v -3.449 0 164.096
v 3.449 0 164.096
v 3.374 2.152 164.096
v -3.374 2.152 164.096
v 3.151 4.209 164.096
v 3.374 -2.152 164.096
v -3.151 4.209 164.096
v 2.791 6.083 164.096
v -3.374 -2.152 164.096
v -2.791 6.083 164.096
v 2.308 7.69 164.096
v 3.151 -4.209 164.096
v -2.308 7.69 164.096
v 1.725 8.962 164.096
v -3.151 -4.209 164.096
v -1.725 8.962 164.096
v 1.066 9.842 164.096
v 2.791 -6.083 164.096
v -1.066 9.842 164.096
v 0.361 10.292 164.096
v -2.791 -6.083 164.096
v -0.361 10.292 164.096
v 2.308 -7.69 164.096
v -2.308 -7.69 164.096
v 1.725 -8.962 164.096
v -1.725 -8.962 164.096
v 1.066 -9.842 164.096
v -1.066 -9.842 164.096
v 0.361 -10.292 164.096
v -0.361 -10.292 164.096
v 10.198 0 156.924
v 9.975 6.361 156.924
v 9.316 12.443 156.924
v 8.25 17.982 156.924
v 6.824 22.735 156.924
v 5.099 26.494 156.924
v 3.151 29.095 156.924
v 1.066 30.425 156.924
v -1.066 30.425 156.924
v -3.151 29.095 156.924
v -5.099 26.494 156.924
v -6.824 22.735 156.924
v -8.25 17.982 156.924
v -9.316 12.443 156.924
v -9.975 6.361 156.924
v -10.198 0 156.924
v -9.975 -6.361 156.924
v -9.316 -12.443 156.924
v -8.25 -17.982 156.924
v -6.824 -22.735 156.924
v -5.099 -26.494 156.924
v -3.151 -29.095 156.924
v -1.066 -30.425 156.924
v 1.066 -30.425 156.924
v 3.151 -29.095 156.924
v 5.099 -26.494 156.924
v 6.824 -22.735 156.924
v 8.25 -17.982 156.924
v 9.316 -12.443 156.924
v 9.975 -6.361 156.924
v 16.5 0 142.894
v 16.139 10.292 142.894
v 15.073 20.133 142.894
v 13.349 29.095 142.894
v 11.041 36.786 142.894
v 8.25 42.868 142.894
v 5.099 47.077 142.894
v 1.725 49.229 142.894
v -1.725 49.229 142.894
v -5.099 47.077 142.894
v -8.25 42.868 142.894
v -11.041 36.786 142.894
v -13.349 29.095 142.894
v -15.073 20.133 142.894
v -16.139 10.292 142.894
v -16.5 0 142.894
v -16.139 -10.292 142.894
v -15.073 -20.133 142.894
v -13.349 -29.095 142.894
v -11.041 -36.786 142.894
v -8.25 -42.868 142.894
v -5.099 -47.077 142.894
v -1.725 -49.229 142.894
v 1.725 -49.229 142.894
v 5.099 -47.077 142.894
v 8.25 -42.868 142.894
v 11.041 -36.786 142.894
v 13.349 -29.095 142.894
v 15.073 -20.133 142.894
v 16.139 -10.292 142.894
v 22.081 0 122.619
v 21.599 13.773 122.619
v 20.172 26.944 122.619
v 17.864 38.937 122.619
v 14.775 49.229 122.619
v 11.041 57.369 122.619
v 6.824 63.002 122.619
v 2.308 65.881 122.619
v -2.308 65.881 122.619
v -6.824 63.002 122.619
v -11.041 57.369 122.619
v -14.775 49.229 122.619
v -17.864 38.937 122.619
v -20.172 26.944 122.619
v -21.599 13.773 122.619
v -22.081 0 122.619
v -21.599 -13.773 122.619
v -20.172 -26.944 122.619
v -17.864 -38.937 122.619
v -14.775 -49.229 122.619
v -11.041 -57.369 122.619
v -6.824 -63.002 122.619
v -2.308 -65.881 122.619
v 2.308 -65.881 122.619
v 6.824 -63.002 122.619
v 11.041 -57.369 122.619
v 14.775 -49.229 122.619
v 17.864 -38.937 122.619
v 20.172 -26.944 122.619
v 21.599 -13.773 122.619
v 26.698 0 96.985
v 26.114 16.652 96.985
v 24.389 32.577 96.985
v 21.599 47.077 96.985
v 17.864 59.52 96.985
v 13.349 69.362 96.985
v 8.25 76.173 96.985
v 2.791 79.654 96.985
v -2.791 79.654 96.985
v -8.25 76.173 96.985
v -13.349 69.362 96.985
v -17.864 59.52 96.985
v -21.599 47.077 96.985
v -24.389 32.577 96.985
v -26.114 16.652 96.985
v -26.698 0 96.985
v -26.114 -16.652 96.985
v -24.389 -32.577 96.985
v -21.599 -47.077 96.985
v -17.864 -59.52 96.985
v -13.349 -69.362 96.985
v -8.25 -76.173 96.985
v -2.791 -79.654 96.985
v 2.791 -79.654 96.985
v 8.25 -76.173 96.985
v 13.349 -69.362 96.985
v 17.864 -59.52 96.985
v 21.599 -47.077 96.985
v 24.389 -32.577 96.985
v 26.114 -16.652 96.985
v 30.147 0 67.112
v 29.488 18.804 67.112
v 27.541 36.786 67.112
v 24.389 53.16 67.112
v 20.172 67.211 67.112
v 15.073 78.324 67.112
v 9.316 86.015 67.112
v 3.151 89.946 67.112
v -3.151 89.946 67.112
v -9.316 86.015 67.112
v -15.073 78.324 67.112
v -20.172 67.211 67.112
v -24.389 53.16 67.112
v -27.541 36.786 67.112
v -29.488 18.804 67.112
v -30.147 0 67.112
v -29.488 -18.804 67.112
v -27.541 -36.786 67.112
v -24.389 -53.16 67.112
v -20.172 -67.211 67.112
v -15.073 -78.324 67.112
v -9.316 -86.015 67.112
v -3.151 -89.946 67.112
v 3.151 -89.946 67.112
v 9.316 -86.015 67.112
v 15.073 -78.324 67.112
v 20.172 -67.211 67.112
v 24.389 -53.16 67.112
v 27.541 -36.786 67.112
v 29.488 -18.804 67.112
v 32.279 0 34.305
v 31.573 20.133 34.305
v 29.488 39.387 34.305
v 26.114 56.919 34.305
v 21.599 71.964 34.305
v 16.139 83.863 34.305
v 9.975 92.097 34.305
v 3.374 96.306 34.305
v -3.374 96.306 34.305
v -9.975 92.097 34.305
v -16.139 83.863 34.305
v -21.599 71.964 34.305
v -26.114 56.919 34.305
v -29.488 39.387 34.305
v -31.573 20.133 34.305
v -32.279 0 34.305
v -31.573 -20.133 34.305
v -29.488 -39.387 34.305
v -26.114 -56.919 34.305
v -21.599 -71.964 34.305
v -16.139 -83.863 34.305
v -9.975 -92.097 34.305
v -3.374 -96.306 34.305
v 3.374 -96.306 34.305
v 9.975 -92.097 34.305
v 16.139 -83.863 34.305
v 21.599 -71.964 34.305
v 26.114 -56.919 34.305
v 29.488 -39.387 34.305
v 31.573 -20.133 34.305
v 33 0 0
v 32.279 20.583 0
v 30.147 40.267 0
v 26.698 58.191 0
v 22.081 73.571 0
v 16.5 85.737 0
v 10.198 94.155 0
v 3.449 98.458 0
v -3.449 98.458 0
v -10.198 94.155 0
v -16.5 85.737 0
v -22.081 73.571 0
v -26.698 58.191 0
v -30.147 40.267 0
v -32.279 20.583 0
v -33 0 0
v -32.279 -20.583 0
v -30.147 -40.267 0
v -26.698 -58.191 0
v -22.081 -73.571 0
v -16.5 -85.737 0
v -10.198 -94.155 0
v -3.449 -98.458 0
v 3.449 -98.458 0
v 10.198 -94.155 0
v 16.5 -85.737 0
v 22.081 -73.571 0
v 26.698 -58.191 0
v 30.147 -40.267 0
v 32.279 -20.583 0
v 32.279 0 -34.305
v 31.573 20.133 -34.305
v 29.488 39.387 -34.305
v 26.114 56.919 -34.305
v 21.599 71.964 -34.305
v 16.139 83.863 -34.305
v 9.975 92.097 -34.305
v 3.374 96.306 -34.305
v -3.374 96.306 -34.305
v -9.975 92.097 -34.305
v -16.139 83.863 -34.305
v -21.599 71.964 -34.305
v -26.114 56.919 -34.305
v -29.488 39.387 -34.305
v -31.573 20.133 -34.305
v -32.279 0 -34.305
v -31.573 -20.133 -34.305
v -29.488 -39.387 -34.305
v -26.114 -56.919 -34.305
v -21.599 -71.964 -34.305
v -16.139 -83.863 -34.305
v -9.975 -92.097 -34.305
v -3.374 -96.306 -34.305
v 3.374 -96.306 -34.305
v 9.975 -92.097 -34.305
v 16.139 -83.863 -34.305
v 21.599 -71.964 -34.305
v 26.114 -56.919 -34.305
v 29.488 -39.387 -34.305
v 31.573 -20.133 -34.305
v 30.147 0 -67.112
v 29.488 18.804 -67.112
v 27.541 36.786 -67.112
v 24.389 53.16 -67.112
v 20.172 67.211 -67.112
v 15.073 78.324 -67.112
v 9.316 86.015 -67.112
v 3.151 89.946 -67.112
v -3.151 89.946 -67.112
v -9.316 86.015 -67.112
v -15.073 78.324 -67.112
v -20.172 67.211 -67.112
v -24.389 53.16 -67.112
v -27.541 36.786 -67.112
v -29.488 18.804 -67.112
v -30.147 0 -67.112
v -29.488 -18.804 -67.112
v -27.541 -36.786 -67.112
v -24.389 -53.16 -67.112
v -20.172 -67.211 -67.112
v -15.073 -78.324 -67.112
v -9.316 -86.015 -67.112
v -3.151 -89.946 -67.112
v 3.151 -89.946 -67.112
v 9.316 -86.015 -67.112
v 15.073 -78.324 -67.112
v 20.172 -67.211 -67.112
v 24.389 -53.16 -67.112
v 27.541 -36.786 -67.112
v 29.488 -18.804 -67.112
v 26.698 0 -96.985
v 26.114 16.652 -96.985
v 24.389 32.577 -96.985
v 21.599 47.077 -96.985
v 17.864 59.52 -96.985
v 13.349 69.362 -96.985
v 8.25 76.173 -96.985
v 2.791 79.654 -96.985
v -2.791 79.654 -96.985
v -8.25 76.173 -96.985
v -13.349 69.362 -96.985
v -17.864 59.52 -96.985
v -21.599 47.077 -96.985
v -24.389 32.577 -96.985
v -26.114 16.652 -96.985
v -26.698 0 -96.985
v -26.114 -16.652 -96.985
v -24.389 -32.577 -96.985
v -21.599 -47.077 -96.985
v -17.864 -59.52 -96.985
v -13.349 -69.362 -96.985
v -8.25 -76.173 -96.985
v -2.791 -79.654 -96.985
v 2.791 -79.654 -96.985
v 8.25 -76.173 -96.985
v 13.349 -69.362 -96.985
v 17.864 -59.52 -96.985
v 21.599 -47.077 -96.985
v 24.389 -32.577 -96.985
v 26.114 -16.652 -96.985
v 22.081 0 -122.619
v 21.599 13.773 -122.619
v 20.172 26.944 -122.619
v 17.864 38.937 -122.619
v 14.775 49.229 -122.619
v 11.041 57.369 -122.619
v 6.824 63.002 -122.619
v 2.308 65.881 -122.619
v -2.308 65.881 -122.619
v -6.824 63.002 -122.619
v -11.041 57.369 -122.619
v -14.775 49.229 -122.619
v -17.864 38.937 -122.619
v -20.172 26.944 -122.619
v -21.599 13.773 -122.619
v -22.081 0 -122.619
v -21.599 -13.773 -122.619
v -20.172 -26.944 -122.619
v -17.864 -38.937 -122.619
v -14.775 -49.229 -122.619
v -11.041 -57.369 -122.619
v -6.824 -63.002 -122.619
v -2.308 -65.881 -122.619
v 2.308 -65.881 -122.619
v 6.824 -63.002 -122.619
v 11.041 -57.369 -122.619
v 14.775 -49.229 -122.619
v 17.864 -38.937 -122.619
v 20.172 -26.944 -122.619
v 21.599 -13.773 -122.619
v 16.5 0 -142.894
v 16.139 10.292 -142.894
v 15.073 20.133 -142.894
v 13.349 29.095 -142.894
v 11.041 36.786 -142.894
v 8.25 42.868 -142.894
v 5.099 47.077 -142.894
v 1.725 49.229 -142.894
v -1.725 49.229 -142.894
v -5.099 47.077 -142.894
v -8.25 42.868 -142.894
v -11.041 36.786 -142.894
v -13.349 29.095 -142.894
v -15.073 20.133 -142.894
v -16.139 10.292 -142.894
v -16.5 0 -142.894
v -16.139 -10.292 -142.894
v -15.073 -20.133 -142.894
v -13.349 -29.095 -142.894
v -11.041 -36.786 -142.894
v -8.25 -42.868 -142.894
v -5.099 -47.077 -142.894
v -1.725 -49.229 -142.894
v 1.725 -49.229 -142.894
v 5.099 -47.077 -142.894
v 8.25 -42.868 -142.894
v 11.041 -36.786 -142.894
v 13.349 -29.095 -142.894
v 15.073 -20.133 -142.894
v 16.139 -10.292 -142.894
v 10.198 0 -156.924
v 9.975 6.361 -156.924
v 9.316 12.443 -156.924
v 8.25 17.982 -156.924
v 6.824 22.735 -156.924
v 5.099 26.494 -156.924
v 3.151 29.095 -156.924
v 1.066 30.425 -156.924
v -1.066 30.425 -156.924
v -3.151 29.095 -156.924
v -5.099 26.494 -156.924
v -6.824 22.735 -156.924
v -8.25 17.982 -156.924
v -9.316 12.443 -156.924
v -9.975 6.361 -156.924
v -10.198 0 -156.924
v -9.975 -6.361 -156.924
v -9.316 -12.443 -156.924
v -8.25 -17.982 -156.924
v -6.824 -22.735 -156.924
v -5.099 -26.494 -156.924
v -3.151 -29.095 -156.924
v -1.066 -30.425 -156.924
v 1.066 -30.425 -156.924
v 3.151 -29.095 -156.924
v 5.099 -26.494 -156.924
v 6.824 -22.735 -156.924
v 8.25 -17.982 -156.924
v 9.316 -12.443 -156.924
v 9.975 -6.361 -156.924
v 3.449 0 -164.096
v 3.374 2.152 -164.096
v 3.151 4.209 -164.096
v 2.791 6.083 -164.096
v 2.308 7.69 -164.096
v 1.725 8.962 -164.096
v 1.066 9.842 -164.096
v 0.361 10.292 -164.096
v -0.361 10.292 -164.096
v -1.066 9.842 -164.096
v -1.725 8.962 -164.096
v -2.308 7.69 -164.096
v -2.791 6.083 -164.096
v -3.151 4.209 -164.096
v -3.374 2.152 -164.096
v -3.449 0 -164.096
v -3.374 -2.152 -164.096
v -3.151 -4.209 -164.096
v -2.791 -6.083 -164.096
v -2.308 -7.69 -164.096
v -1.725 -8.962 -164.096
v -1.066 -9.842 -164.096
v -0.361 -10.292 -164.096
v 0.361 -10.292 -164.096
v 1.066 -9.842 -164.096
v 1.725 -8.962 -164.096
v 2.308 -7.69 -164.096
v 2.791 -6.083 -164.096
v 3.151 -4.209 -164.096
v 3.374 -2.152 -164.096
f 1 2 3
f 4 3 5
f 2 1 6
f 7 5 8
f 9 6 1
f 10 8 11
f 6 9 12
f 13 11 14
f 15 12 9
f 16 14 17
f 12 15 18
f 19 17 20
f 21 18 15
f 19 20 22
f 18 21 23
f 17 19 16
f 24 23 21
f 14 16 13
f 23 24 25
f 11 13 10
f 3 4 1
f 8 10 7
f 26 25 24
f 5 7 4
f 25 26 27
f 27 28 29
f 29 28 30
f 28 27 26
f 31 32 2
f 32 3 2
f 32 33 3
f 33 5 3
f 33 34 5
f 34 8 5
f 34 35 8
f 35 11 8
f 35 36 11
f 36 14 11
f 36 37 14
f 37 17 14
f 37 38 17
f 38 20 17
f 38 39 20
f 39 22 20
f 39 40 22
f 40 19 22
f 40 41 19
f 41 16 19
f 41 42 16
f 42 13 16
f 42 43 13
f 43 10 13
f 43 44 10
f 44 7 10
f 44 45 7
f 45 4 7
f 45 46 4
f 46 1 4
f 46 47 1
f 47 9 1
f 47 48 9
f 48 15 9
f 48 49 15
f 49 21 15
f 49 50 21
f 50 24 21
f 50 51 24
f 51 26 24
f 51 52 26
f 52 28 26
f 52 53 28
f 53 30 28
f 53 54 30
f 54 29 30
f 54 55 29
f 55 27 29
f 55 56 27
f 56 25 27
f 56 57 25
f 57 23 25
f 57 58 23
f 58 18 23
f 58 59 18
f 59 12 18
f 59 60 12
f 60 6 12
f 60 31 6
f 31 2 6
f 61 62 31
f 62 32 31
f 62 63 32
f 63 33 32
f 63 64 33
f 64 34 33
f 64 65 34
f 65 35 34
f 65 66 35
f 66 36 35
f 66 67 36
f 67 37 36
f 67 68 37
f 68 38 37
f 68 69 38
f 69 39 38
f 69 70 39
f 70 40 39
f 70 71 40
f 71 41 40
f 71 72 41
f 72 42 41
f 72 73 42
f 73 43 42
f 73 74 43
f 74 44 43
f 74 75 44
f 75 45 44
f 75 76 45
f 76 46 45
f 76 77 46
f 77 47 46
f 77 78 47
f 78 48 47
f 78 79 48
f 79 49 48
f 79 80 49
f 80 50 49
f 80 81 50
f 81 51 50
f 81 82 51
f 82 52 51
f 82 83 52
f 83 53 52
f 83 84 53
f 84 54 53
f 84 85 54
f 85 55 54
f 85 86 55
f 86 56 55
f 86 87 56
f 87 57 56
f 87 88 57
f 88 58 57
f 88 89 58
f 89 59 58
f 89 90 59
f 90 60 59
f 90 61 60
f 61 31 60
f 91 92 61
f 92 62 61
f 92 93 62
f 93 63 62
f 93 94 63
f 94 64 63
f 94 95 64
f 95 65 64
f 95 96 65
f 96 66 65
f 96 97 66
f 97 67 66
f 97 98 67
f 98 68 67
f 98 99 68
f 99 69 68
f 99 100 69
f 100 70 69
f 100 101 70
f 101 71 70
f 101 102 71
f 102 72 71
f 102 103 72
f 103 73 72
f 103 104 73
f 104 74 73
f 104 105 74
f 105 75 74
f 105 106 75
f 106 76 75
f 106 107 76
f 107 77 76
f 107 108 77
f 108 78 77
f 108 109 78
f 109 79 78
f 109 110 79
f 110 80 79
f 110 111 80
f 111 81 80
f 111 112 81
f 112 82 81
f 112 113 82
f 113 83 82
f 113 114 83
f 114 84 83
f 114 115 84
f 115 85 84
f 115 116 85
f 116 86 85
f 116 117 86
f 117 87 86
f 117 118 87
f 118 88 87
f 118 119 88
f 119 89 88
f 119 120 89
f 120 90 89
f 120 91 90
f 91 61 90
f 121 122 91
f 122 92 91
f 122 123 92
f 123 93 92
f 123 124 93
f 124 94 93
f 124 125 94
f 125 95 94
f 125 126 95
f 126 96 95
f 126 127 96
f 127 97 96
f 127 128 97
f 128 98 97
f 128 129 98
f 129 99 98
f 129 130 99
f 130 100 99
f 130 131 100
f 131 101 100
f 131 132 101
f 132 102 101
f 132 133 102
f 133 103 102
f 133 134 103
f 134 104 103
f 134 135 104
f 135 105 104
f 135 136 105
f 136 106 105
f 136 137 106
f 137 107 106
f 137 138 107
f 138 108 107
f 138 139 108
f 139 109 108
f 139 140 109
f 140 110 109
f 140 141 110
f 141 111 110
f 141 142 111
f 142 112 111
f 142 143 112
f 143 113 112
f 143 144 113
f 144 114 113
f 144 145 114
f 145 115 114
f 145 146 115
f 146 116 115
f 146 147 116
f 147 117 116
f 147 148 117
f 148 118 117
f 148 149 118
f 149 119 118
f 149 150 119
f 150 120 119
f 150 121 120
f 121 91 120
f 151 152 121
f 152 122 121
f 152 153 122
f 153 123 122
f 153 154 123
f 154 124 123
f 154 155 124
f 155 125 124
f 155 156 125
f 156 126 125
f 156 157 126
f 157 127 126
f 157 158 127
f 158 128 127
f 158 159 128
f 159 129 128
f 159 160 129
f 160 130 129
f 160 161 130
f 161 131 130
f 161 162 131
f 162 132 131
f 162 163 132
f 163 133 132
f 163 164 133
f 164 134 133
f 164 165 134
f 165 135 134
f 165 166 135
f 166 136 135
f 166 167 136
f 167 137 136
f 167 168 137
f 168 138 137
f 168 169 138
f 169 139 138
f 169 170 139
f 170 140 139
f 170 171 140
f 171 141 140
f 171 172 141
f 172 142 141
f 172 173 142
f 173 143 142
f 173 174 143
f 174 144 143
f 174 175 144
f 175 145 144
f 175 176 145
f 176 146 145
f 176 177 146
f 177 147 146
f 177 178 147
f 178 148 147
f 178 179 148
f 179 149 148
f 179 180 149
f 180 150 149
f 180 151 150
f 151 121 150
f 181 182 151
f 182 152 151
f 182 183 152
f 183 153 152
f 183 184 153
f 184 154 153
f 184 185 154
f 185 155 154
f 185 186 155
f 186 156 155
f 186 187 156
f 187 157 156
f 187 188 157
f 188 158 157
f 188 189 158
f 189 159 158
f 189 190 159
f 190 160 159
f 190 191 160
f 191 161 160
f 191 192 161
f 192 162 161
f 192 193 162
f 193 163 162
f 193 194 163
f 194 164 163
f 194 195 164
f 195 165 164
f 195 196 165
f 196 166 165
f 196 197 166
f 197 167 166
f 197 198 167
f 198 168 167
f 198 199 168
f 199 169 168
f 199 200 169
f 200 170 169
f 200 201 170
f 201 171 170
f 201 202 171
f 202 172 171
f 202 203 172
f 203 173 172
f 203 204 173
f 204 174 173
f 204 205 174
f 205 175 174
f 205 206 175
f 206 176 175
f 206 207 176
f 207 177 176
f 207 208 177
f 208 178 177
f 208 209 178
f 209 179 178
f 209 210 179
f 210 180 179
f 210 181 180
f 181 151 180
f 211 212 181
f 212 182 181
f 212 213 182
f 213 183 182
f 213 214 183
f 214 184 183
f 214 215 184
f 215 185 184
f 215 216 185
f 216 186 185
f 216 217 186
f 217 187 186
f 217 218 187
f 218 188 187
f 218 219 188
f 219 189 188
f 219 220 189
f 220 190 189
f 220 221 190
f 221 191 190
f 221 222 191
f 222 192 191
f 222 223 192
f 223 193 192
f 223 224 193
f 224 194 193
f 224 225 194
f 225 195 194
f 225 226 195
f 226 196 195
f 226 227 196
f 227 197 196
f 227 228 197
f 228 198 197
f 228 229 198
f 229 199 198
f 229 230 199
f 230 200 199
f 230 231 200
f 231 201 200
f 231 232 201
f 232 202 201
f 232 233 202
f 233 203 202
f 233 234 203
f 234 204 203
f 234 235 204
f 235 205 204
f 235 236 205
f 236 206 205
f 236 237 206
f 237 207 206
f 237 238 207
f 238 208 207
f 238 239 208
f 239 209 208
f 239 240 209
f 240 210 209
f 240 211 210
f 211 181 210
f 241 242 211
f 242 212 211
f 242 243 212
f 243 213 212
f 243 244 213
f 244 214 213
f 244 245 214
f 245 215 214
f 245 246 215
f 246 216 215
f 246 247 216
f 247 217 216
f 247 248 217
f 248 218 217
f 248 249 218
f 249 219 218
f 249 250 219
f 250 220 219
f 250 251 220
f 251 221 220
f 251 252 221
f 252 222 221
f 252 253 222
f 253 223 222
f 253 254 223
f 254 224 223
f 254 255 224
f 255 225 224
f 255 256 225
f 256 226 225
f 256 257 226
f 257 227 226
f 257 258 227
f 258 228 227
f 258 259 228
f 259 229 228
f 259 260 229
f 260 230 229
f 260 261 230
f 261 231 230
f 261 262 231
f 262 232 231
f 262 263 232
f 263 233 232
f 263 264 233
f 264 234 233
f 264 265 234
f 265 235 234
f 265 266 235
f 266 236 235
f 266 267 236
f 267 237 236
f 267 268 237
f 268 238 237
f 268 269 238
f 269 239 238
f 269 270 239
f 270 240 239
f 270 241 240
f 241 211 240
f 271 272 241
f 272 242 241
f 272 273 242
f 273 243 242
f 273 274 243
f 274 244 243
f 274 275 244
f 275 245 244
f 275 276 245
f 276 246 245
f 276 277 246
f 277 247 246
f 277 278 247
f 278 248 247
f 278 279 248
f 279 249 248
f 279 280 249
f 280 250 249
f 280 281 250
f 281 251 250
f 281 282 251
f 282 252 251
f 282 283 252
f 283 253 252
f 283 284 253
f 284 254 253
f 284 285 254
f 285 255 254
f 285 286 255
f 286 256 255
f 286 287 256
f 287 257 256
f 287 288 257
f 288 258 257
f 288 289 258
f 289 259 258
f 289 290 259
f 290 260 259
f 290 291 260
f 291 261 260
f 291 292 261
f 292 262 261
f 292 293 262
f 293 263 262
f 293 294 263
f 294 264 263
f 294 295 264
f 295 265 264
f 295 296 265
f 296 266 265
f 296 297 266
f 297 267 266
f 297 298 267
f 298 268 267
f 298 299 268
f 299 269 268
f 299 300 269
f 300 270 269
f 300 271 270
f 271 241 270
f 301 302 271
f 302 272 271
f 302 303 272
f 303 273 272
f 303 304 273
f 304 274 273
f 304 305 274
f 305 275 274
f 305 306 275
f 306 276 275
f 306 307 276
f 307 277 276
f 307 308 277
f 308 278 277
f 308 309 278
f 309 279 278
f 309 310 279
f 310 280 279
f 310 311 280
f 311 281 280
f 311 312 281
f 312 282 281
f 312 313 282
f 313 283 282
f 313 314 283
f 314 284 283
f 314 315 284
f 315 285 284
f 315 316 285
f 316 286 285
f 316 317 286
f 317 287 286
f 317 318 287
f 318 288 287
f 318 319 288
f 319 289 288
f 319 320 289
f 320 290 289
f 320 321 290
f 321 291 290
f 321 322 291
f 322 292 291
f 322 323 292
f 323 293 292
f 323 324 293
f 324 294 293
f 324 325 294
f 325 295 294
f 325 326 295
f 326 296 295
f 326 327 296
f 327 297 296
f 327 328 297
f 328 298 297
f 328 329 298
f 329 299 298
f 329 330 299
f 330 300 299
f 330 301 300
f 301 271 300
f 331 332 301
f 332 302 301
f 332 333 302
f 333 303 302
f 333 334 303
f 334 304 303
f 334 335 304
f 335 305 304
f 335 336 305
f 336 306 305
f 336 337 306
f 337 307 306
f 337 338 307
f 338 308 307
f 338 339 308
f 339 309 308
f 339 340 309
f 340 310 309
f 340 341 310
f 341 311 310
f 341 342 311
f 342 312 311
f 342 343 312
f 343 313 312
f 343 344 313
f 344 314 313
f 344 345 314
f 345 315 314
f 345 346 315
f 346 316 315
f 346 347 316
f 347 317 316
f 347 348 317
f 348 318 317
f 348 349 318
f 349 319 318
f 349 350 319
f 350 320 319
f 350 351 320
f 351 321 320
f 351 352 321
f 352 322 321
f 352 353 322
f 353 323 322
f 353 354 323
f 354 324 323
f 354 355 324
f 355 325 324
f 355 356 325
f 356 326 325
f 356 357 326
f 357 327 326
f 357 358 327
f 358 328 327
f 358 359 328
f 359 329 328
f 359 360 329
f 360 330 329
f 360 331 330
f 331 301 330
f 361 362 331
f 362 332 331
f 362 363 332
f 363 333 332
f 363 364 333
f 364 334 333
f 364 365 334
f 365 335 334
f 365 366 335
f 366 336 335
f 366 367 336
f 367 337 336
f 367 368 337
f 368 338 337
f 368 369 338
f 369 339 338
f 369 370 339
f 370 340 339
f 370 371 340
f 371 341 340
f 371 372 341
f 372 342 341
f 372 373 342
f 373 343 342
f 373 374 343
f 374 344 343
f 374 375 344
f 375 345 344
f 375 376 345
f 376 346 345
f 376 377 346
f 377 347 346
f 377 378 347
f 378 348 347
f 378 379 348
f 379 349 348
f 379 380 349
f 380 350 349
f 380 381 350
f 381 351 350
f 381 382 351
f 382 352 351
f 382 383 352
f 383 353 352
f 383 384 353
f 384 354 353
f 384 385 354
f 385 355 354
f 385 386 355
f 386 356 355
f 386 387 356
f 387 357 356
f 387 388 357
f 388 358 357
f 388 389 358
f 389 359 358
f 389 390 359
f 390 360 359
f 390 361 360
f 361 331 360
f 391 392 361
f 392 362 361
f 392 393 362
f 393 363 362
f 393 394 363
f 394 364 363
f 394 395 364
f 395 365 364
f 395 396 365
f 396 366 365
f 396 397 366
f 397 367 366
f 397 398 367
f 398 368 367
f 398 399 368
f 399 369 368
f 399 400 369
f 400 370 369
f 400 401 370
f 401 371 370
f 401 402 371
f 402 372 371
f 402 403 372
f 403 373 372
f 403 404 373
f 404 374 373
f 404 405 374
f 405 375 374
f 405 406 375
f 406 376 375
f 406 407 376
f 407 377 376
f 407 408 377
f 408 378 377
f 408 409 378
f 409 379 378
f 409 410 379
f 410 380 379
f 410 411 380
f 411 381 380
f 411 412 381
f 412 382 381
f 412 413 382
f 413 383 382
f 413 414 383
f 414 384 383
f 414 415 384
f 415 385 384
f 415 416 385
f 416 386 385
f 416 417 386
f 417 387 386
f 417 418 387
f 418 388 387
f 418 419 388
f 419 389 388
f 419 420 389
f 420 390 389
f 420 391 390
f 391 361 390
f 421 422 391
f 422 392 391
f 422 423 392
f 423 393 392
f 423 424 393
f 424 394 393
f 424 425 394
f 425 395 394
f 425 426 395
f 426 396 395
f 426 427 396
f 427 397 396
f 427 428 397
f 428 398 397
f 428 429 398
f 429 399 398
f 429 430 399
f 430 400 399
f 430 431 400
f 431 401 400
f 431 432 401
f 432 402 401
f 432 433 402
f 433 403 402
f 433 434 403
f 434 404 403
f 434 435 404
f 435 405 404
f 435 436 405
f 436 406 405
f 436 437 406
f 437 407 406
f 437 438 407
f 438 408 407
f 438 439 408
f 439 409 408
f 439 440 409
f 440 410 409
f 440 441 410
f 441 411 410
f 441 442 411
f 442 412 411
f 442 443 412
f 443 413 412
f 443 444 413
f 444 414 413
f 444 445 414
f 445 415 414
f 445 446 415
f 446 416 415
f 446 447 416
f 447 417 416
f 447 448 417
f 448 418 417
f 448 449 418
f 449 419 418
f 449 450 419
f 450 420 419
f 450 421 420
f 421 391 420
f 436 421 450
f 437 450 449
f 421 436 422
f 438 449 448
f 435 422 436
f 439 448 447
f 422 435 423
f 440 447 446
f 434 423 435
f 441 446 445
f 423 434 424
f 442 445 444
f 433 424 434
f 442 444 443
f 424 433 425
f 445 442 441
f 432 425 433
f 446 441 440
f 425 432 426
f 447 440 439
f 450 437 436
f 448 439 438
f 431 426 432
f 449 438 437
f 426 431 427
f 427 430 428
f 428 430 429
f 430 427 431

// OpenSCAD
// Generated by SolidPython 1.0.1 on 2020-07-29 00:46:45


scale(v = [3, 9, 15]) {
	sphere(r = 11);
}
/***********************************************
*********      SolidPython code:      **********
************************************************
 
# import packages: SolidPython
from solid import *
from solid.utils import *
from itertools import chain, combinations, permutations


class Resize:

    def __init__(self, scad_file):
        self.scad_file = scad_file
        #self.scad_file = import_scad(scad_file)
        # cone/cylinder param:
        self.r1 = 0
        self.r2 = 0
        self.h = 0
        # rectangular prism param:
        self.w = 0
        self.l = 0
        # ellipse param:
        self.r = 0

    # import OpenScad code (file name corresponds to shape)


    # classify shape + parameters
    def assign(self, param1, param2, param3):
        if self.scad_file == 'cone.scad':
            self.r1 = param1
            self.r2 = param2
            self.h = param3
        elif self.scad_file == 'cylinder.scad':
            self.r1 = param1
            self.r2 = param2
            self.h = param3
        elif self.scad_file == 'rectangularPrism.scad':
            self.h = param1
            self.l = param2
            self.w = param3
        else:
            self.r = param1
            self.h = param2

    # resize parameters
    def iterate(self):
        x = range(3, 20, 2)
        i = 1
        if self.scad_file == 'cone.scad':
            tempList = list(permutations(x, 2))
            for temp in tempList:
                param1 = temp[0]
                param2 = temp[1]
                filepath = 'produced_scad_files/' + 'cone' + str(param1) + '_' + str(param2) + '_' + '.scad'
                scad_render_to_file(cylinder(h=param1, r1=param2, r2=0), filepath)

        elif self.scad_file == 'cylinder.scad':
            tempList = list(permutations(x, 3))
            for temp in tempList:
                param1 = temp[0]
                param2 = temp[1]
                filepath = 'produced_scad_files/' + 'cylinder' + str(param1) + '_' + str(param2) + '_' + '.scad'
                scad_render_to_file(cylinder(h=param1, r1=param2, r2=param2), filepath)

        elif self.scad_file == 'rectangularPrism.scad':
            tempList = list(permutations(x, 3))
            for temp in tempList:
                param1 = temp[0]
                param2 = temp[1]
                param3 = temp[2]
                filepath = 'produced_scad_files/' + 'rectangularPrism' + str(param1) + '_' + str(param2) + '_' + str(
                    param3) + '.scad'
                scad_render_to_file(cube(size=(param1, param2, param3)), filepath)

        elif self.scad_file == 'ellipse.scad':
            tempList = list(permutations(x, 4))
            for temp in tempList:
                param1 = temp[0]
                param2 = temp[1]
                param3 = temp[2]
                param4 = temp[3]
                filepath = 'produced_scad_files/' + 'ellipse' + str(param1) + '_' + str(param2) + '_' + str(param3) + '_' + str(param4) + '.scad'
                scad_render_to_file(scale([param1, param2, param3])(sphere(r=param4)), filepath)

    def render_to_scadfile(self):
        scad_render_to_file(scad, 'example.scad') 
 
************************************************/
